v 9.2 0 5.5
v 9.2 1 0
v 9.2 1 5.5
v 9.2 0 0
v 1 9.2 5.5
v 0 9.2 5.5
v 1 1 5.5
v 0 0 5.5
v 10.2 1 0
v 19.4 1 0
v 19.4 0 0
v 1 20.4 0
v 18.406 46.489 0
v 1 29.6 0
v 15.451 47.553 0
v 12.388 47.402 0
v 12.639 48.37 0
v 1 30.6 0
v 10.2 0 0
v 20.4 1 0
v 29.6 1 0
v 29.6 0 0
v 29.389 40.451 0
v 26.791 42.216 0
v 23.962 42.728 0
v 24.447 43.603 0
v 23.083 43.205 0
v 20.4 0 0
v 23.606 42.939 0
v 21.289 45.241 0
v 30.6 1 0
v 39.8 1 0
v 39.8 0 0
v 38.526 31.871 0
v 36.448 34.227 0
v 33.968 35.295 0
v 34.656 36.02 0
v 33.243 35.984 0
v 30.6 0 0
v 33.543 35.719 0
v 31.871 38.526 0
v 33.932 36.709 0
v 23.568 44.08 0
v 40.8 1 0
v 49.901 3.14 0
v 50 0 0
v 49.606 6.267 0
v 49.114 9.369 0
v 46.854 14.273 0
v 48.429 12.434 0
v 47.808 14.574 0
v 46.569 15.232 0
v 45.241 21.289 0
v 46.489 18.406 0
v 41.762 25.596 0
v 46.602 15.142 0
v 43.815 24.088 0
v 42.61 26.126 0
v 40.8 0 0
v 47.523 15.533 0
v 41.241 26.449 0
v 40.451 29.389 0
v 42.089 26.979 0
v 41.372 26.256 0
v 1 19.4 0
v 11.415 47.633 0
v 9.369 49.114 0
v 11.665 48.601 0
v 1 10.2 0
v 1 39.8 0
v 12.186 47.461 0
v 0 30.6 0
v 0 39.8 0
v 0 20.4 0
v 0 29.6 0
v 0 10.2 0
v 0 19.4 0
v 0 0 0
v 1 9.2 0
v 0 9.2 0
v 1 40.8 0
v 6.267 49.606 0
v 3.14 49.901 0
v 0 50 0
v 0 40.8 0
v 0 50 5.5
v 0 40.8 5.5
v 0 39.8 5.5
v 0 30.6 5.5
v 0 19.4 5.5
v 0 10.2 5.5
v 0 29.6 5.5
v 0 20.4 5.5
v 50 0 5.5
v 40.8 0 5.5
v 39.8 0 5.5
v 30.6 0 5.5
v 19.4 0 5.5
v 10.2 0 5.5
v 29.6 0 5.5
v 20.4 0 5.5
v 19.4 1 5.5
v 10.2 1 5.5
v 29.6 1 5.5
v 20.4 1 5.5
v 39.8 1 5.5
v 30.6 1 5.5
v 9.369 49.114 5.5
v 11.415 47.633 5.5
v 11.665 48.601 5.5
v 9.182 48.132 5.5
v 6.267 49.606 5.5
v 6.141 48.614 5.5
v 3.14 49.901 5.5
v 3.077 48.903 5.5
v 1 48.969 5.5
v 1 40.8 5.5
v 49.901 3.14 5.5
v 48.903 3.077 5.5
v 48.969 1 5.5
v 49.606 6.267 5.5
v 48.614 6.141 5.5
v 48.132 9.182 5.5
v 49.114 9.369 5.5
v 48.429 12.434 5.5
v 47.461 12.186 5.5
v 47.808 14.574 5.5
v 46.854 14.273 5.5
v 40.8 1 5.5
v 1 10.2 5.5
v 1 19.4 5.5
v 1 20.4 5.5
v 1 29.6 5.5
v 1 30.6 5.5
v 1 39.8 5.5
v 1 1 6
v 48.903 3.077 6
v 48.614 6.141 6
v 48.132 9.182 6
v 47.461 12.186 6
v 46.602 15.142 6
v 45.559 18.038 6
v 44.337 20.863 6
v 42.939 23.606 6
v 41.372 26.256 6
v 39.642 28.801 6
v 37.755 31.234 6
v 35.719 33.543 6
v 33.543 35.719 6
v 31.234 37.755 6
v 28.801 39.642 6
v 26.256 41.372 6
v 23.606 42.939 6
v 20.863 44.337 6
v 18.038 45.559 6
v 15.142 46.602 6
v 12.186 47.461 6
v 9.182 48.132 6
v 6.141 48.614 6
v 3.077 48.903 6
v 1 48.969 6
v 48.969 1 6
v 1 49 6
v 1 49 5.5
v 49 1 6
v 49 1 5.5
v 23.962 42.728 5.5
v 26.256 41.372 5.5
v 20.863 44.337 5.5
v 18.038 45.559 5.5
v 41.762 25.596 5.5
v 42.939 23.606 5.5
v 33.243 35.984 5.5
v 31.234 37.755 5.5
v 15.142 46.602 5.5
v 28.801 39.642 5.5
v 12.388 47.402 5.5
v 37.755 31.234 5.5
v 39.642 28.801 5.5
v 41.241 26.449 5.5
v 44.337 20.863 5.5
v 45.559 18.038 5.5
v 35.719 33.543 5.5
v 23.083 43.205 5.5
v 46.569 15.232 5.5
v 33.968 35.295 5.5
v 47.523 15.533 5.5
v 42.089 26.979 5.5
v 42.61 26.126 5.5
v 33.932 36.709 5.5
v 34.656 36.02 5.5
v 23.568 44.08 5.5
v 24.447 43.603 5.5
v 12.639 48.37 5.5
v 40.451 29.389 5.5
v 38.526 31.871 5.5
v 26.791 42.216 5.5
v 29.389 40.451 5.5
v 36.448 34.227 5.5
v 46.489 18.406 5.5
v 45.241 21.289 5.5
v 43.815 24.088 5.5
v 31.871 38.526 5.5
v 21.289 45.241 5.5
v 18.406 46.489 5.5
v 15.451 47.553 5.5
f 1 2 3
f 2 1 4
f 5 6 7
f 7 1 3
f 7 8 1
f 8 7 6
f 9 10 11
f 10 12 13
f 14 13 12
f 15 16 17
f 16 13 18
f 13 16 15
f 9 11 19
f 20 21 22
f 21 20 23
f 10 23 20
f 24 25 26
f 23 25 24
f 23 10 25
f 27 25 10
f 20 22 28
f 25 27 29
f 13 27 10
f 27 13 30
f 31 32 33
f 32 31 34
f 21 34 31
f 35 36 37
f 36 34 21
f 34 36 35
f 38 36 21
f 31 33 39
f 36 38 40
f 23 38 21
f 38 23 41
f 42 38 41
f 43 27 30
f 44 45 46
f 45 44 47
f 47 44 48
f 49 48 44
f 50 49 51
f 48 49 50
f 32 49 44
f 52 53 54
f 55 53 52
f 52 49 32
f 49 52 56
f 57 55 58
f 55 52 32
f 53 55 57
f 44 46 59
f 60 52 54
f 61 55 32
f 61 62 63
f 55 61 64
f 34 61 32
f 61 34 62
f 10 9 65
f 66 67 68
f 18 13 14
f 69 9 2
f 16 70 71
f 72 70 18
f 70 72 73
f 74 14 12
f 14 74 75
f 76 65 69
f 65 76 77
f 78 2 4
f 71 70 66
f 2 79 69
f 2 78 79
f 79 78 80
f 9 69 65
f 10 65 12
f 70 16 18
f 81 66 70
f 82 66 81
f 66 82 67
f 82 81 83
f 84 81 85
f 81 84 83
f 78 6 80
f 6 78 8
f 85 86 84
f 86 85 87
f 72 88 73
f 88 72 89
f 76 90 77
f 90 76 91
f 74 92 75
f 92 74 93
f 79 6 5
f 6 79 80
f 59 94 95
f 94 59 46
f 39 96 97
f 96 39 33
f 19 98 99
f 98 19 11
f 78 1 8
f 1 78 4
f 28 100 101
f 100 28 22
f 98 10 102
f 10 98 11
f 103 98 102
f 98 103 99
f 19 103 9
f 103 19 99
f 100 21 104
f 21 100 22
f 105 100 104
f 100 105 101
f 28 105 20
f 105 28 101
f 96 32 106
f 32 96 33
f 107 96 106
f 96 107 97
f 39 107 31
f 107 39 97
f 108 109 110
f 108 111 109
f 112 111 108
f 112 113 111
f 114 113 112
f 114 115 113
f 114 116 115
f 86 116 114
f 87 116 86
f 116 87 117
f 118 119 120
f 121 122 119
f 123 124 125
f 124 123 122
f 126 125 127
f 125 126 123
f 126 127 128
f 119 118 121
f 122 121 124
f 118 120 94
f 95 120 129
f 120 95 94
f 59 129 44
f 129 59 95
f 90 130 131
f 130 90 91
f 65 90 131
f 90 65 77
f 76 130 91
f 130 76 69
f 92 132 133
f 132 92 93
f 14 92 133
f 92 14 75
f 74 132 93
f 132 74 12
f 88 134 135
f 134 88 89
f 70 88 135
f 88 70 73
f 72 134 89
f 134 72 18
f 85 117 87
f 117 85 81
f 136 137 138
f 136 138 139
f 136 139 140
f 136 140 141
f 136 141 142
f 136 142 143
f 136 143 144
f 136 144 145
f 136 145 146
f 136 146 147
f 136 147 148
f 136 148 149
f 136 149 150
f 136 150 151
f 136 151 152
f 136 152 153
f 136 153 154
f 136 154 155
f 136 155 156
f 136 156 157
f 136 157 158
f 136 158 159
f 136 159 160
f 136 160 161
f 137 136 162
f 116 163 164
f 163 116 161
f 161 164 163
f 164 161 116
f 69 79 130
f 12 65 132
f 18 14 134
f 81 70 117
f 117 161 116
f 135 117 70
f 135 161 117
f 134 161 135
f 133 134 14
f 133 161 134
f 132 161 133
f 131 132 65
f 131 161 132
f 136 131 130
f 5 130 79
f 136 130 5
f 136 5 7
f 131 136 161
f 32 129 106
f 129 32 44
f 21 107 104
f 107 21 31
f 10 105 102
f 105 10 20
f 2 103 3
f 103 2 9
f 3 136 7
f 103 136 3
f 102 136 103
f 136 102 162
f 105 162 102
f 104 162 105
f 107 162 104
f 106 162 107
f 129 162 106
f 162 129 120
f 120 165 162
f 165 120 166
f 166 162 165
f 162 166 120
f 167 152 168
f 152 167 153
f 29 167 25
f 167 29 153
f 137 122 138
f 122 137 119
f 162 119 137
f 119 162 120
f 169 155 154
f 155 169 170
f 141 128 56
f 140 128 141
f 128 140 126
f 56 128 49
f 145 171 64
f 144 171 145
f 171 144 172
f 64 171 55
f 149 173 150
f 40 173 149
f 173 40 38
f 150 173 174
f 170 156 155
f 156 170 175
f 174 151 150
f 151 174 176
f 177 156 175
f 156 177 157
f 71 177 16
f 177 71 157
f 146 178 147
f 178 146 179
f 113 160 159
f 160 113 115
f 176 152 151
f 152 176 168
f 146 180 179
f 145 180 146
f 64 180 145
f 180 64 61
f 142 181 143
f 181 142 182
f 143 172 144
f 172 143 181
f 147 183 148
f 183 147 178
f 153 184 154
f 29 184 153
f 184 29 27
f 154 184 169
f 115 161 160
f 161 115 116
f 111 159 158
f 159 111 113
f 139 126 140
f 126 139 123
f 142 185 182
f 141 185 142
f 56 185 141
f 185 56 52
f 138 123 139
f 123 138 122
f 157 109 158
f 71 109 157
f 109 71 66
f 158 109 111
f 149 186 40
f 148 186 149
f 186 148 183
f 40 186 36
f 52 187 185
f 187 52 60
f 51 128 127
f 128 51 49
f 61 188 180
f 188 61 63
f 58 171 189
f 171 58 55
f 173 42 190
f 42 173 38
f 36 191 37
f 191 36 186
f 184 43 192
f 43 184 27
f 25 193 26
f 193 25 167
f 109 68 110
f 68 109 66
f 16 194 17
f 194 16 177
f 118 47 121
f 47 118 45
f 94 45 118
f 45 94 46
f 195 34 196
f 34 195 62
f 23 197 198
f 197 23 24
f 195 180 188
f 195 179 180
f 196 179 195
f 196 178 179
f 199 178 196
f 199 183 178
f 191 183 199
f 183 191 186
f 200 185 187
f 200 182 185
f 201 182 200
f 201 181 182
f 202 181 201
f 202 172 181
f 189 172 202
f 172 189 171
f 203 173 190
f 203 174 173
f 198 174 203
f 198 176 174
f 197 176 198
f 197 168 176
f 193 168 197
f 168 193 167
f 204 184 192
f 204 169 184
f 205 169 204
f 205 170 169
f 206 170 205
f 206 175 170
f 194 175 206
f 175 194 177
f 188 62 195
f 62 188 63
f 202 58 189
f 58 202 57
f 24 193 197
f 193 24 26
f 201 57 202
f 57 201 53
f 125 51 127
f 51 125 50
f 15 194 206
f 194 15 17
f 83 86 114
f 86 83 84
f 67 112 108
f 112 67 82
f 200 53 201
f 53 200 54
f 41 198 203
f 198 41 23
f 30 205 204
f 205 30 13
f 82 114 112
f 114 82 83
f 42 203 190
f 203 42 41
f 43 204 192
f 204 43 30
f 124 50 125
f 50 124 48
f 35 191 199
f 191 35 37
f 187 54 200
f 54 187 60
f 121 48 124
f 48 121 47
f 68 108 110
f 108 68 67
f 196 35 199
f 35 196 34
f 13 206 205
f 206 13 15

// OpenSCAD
/* [Base Tile Size] */
x = 2; //[1,2,3,4]
y = 2; //[1,2,3,4]

/* [Edge Tile Support] */
// Size of edge tile addition, 9.2 is standard for openforge
edge_width = 12.5;
edge = "false"; // [false, true]

module curved_full_base(x,y,
        edge_width=12.5, edge="false") {
    e = edge == "true"?edge_width:0;
    l = 0;
    r = e;
    f = 0;
    b = e;
    color("LightGrey") intersection() {
        scale([x < y ? ((25*x)+e)/((25*y)+e) : 1, y < x ? ((25*y)+e)/((25*x)+e) : 1,1]) translate([0,0,0]) cylinder(10,max([x, y])*25+e, max([x,y])*25+e,$fn=100);
        difference() {
            union() {
                translate([0,0,0]) intersection() {
                    stone_base(x,y,edge_width,edge);
                    union() {
                        scale([x < y ? ((25*x)-1+e)/((25*y)-1+e) : 1, y < x ? ((25*y)-1+e)/((25*x)-1+e) : 1,1]) translate([0,0,0]) cylinder(6,max([x, y])*25-1+e, max([x,y])*25-1+e,$fn=100);
                        cube([25*x+e,1,8]);
                        cube([1,25*y+e,8]);
                    }
                }
                difference() {
                    union() {
                        intersection() {
                            translate([0,0,0]) difference() {
                                scale([x < y ? ((25*x)+e)/((25*y)+e) : 1, y < x ? ((25*y)+e)/((25*x)+e) : 1,1]) translate([0,0,0]) cylinder(5.5,max([x, y])*25+e, max([x,y])*25+e,$fn=100);
                                //#scale([x < y ? ((25*x)-9.2)/((25*y)-9.2) : 1, y < x ? ((25*y)-9.2)/((25*x)-9.2) : 1,1]) translate([0,0,-1]) cylinder(10,max([x, y])*25-9.2, max([x,y])*25-9.2,$fn=100);
                                if(x == 1) {
                                    if(y == 1) {
                                        translate([0,-.5,0]) rotate([0,0,50]) translate([0,0,-1]) cube([25*(max(x,y))+1+e,1,8]);
                                    } else if(y == 2) {
                                        translate([0,10.2*0.5,0]) rotate([0,0,0]) translate([0,0,-1]) cube([25*(max(x,y))+1+e,1,8]);
                                        translate([0,10.2*1.5-3,0]) rotate([0,0,8]) translate([0,0,-1]) cube([25*(max(x,y))+1+e,1,8]);
                                        translate([0,10.2*2.5-5,0]) rotate([0,0,17]) translate([0,0,-1]) cube([25*(max(x,y))+1+e,1,8]);
                                        translate([0,10.2*3.5-6,0]) rotate([0,0,28]) translate([0,0,-1]) cube([25*(max(x,y))+1+e,1,8]);
                                    } else if(y == 3) {
                                        translate([0,10.2*0.775-.5,0]) rotate([0,0,1]) translate([0,0,-1]) cube([25*(max(x,y))+1+e,1,8]);
                                        translate([0,10.2*1.8-1.5,0]) rotate([0,0,4]) translate([0,0,-1]) cube([25*(max(x,y))+1+e,1,8]);
                                        translate([0,10.2*2.825-2.5,0]) rotate([0,0,6]) translate([0,0,-1]) cube([25*(max(x,y))+1+e,1,8]);
                                        translate([0,10.2*3.85-3,0]) rotate([0,0,8]) translate([0,0,-1]) cube([25*(max(x,y))+1+e,1,8]);
                                        translate([0,10.2*4.875-3,0]) rotate([0,0,10]) translate([0,0,-1]) cube([25*(max(x,y))+1+e,1,8]);
                                        translate([0,10.2*5.9-3,0]) rotate([0,0,14]) translate([0,0,-1]) cube([25*(max(x,y))+1+e,1,8]);
                                    } else if(y == 4) {
                                        translate([0,10.2*1.2-1,0]) rotate([0,0,1]) translate([0,0,-1]) cube([25*(max(x,y))+1+e,1,8]);
                                        translate([0,10.2*2.2-2,0]) rotate([0,0,4]) translate([0,0,-1]) cube([25*(max(x,y))+1+e,1,8]);
                                        translate([0,10.2*3.2-2.5,0]) rotate([0,0,6]) translate([0,0,-1]) cube([25*(max(x,y))+1+e,1,8]);
                                        translate([0,10.2*4.2-3,0]) rotate([0,0,8]) translate([0,0,-1]) cube([25*(max(x,y))+1+e,1,8]);
                                        translate([0,10.2*5.2-3.5,0]) rotate([0,0,10]) translate([0,0,-1]) cube([25*(max(x,y))+1+e,1,8]);
                                        translate([0,10.2*6.2-4.5,0]) rotate([0,0,14]) translate([0,0,-1]) cube([25*(max(x,y))+1+e,1,8]);
                                        translate([0,10.2*7.2-4.5,0]) rotate([0,0,16]) translate([0,0,-1]) cube([25*(max(x,y))+1+e,1,8]);
                                        translate([0,10.2*8.2-4.25,0]) rotate([0,0,20]) translate([0,0,-1]) cube([25*(max(x,y))+1+e,1,8]);
                                    }
                                } else if(x == 2) {
                                    if(y == 1) {
                                        translate([10.2*0.5,0,0]) rotate([0,0,90-0]) translate([0,0,-1]) cube([25*(max(x,y))+1+e,1,8]);
                                        translate([10.2*1.5-3,0,0]) rotate([0,0,90-8]) translate([0,0,-1]) cube([25*(max(x,y))+1+e,1,8]);
                                        translate([10.2*2.5-5,0,0]) rotate([0,0,90-17]) translate([0,0,-1]) cube([25*(max(x,y))+1+e,1,8]);
                                        translate([10.2*3.5-6,0,0]) rotate([0,0,90-28]) translate([0,0,-1]) cube([25*(max(x,y))+1+e,1,8]);
                                    } else if(y == 2) {
                                        translate([0,-.5,0]) rotate([0,0,17.5]) translate([0,0,-1]) cube([25*(max(x,y))+1+e,1,8]);
                                        translate([0,-.5,0]) rotate([0,0,32]) translate([0,0,-1]) cube([25*(max(x,y))+1+e,1,8]);
                                        translate([0,-.5,0]) rotate([0,0,46.5]) translate([0,0,-1]) cube([25*(max(x,y))+1+e,1,8]);
                                        translate([0,-.5,0]) rotate([0,0,61]) translate([0,0,-1]) cube([25*(max(x,y))+1+e,1,8]);
                                        translate([0,-.5,0]) rotate([0,0,75.5]) translate([0,0,-1]) cube([25*(max(x,y))+1+e,1,8]);
                                    } else if(y == 3) {
                                        translate([0,10.2*1.2-4,0]) rotate([0,0,5.5]) translate([0,0,-1]) cube([25*(max(x,y))+1+e,1,8]);
                                        translate([0,10.2*2.2-6,0]) rotate([0,0,9]) translate([0,0,-1]) cube([25*(max(x,y))+1+e,1,8]);
                                        translate([0,10.2*3.2-8,0]) rotate([0,0,13.25]) translate([0,0,-1]) cube([25*(max(x,y))+1+e,1,8]);
                                        translate([0,10.2*4.2-15.7,0]) rotate([0,0,25]) translate([0,0,-1]) cube([25*(max(x,y))+1+e,1,8]);
                                        translate([0,10.2*5.2-20.5,0]) rotate([0,0,35]) translate([0,0,-1]) cube([25*(max(x,y))+1+e,1,8]);
                                        translate([0,10.2*6.2-23.5,0]) rotate([0,0,45]) translate([0,0,-1]) cube([25*(max(x,y))+1+e,1,8]);
                                        translate([0,10.2*7.2-26,0]) rotate([0,0,60.5]) translate([0,0,-1]) cube([25*(max(x,y))+1+e,1,8]);
                                    } else if(y == 4) {
                                        translate([0,10.2*0.5-3,0]) rotate([0,0,2]) translate([0,0,-1]) cube([25*(max(x,y))+1+e,1,8]);
                                        translate([0,10.2*1.5-7,0]) rotate([0,0,7]) translate([0,0,-1]) cube([25*(max(x,y))+1+e,1,8]);
                                        translate([0,10.2*2.5-10.5,0]) rotate([0,0,12]) translate([0,0,-1]) cube([25*(max(x,y))+1+e,1,8]);
                                        translate([0,10.2*3.5-14.25,0]) rotate([0,0,17]) translate([0,0,-1]) cube([25*(max(x,y))+1+e,1,8]);
                                        translate([0,10.2*4.5-16.5,0]) rotate([0,0,21]) translate([0,0,-1]) cube([25*(max(x,y))+1+e,1,8]);
                                        translate([0,10.2*5.5-18.5,0]) rotate([0,0,25]) translate([0,0,-1]) cube([25*(max(x,y))+1+e,1,8]);
                                        translate([0,10.2*6.5-22,0]) rotate([0,0,32]) translate([0,0,-1]) cube([25*(max(x,y))+1+e,1,8]);
                                        translate([0,10.2*7.5-21.5-.25,0]) rotate([0,0,36]) translate([0,0,-1]) cube([25*(max(x,y))+1+e,1,8]);
                                        translate([0,10.2*8.5-19.25,0]) rotate([0,0,39]) translate([0,0,-1]) cube([25*(max(x,y))+1+e,1,8]);
                                        translate([0,10.2*9.5-21,0]) rotate([0,0,55]) translate([0,0,-1]) cube([25*(max(x,y))+1+e,1,8]);
                                    }
                                } else if(x == 3) {
                                    if(y == 1) {
                                        translate([10.2*0.775-.5,0,0]) rotate([0,0,90-1]) translate([0,0,-1]) cube([25*(max(x,y))+1+e,1,8]);
                                        translate([10.2*1.8-1.5,0,0]) rotate([0,0,90-4]) translate([0,0,-1]) cube([25*(max(x,y))+1+e,1,8]);
                                        translate([10.2*2.825-2.5,0,0]) rotate([0,0,90-6]) translate([0,0,-1]) cube([25*(max(x,y))+1+e,1,8]);
                                        translate([10.2*3.85-3,0,0]) rotate([0,0,90-8]) translate([0,0,-1]) cube([25*(max(x,y))+1+e,1,8]);
                                        translate([10.2*4.875-3,0,0]) rotate([0,0,90-10]) translate([0,0,-1]) cube([25*(max(x,y))+1+e,1,8]);
                                        translate([10.2*5.9-3,0,0]) rotate([0,0,90-14]) translate([0,0,-1]) cube([25*(max(x,y))+1+e,1,8]);
                                    } else if(y == 2) {
                                        translate([10.2*1.2-4,0,0]) rotate([0,0,90-5.5]) translate([0,0,-1]) cube([25*(max(x,y))+1+e,1,8]);
                                        translate([10.2*2.2-6,0,0]) rotate([0,0,90-9]) translate([0,0,-1]) cube([25*(max(x,y))+1+e,1,8]);
                                        translate([10.2*3.2-8,0,0]) rotate([0,0,90-13.25]) translate([0,0,-1]) cube([25*(max(x,y))+1+e,1,8]);
                                        translate([10.2*4.2-15.7,0,0]) rotate([0,0,90-25]) translate([0,0,-1]) cube([25*(max(x,y))+1+e,1,8]);
                                        translate([10.2*5.2-20.5,0,0]) rotate([0,0,90-35]) translate([0,0,-1]) cube([25*(max(x,y))+1+e,1,8]);
                                        translate([10.2*6.2-23.5,0,0]) rotate([0,0,90-45]) translate([0,0,-1]) cube([25*(max(x,y))+1+e,1,8]);
                                        translate([10.2*7.2-26,0,0]) rotate([0,0,90-60.5]) translate([0,0,-1]) cube([25*(max(x,y))+1+e,1,8]);
                                    } else if(y == 3) {
                                        translate([0,-.5,0]) rotate([0,0,9]) translate([0,0,-1]) cube([25*(max(x,y))+1+e,1,8]);
                                        translate([0,-.5,0]) rotate([0,0,18]) translate([0,0,-1]) cube([25*(max(x,y))+1+e,1,8]);
                                        translate([0,-.5,0]) rotate([0,0,27]) translate([0,0,-1]) cube([25*(max(x,y))+1+e,1,8]);
                                        translate([0,-.5,0]) rotate([0,0,36]) translate([0,0,-1]) cube([25*(max(x,y))+1+e,1,8]);
                                        translate([0,-.5,0]) rotate([0,0,45]) translate([0,0,-1]) cube([25*(max(x,y))+1+e,1,8]);
                                        translate([0,-.5,0]) rotate([0,0,54]) translate([0,0,-1]) cube([25*(max(x,y))+1+e,1,8]);
                                        translate([0,-.5,0]) rotate([0,0,63]) translate([0,0,-1]) cube([25*(max(x,y))+1+e,1,8]);
                                        translate([0,-.5,0]) rotate([0,0,72]) translate([0,0,-1]) cube([25*(max(x,y))+1+e,1,8]);
                                        translate([0,-.5,0]) rotate([0,0,81]) translate([0,0,-1]) cube([25*(max(x,y))+1+e,1,8]);
                                    } else if(y == 4) {
                                        translate([0,10.2*1-2,0]) rotate([0,0,2]) translate([0,0,-1]) cube([25*(max(x,y))+1+e,1,8]);
                                        translate([0,10.2*2-7.5,0]) rotate([0,0,7]) translate([0,0,-1]) cube([25*(max(x,y))+1+e,1,8]);
                                        translate([0,10.2*3-12.75,0]) rotate([0,0,12]) translate([0,0,-1]) cube([25*(max(x,y))+1+e,1,8]);
                                        translate([0,10.2*4-14.25-3.75,0]) rotate([0,0,17]) translate([0,0,-1]) cube([25*(max(x,y))+1+e,1,8]);
                                        translate([0,10.2*5-16.5-9,0]) rotate([0,0,24]) translate([0,0,-1]) cube([25*(max(x,y))+1+e,1,8]);
                                        translate([0,10.2*6-18.5-10.25,0]) rotate([0,0,28]) translate([0,0,-1]) cube([25*(max(x,y))+1+e,1,8]);
                                        translate([0,10.2*7-22-17,0]) rotate([0,0,38]) translate([0,0,-1]) cube([25*(max(x,y))+1+e,1,8]);
                                        translate([0,10.2*8-21.5-20.5,0]) rotate([0,0,44]) translate([0,0,-1]) cube([25*(max(x,y))+1+e,1,8]);
                                        translate([0,10.2*9-19.25-32,0]) rotate([0,0,55]) translate([0,0,-1]) cube([25*(max(x,y))+1+e,1,8]);
                                        translate([0,10.2*10-58,0]) rotate([0,0,65]) translate([0,0,-1]) cube([25*(max(x,y))+1+e,1,8]);
                                        translate([0,10.2*11-59,0]) rotate([0,0,75]) translate([0,0,-1]) cube([25*(max(x,y))+1+e,1,8]);
                                    }
                                } else if(x == 4) {
                                    if(y == 1) {
                                        translate([10.2*1.2-1,0,0]) rotate([0,0,90-1]) translate([0,0,-1]) cube([25*(max(x,y))+1+e,1,8]);
                                        translate([10.2*2.2-2,0,0]) rotate([0,0,90-4]) translate([0,0,-1]) cube([25*(max(x,y))+1+e,1,8]);
                                        translate([10.2*3.2-2.5,0,0]) rotate([0,0,90-6]) translate([0,0,-1]) cube([25*(max(x,y))+1+e,1,8]);
                                        translate([10.2*4.2-3,0,0]) rotate([0,0,90-8]) translate([0,0,-1]) cube([25*(max(x,y))+1+e,1,8]);
                                        translate([10.2*5.2-3.5,0,0]) rotate([0,0,90-10]) translate([0,0,-1]) cube([25*(max(x,y))+1+e,1,8]);
                                        translate([10.2*6.2-4.5,0,0]) rotate([0,0,90-14]) translate([0,0,-1]) cube([25*(max(x,y))+1+e,1,8]);
                                        translate([10.2*7.2-4.5,0,0]) rotate([0,0,90-16]) translate([0,0,-1]) cube([25*(max(x,y))+1+e,1,8]);
                                        translate([10.2*8.2-4.25,0,0]) rotate([0,0,90-20]) translate([0,0,-1]) cube([25*(max(x,y))+1+e,1,8]);
                                    } else if(y == 2) {
                                        translate([10.2*0.5-3,0,0]) rotate([0,0,90-2]) translate([0,0,-1]) cube([25*(max(x,y))+1+e,1,8]);
                                        translate([10.2*1.5-7,0,0]) rotate([0,0,90-7]) translate([0,0,-1]) cube([25*(max(x,y))+1+e,1,8]);
                                        translate([10.2*2.5-10.5,0,0]) rotate([0,0,90-12]) translate([0,0,-1]) cube([25*(max(x,y))+1+e,1,8]);
                                        translate([10.2*3.5-14.25,0,0]) rotate([0,0,90-17]) translate([0,0,-1]) cube([25*(max(x,y))+1+e,1,8]);
                                        translate([10.2*4.5-16.5,0,0]) rotate([0,0,90-21]) translate([0,0,-1]) cube([25*(max(x,y))+1+e,1,8]);
                                        translate([10.2*5.5-18.5,0,0]) rotate([0,0,90-25]) translate([0,0,-1]) cube([25*(max(x,y))+1+e,1,8]);
                                        translate([10.2*6.5-22,0,0]) rotate([0,0,90-32]) translate([0,0,-1]) cube([25*(max(x,y))+1+e,1,8]);
                                        translate([10.2*7.5-21.5-.25,0,0]) rotate([0,0,90-36]) translate([0,0,-1]) cube([25*(max(x,y))+1+e,1,8]);
                                        translate([10.2*8.5-19.25,0,0]) rotate([0,0,90-39]) translate([0,0,-1]) cube([25*(max(x,y))+1+e,1,8]);
                                        translate([10.2*9.5-21,0,0]) rotate([0,0,90-55]) translate([0,0,-1]) cube([25*(max(x,y))+1+e,1,8]);
                                    } else if(y == 3) {
                                        translate([10.2*1-2,0,0]) rotate([0,0,90-2]) translate([0,0,-1]) cube([25*(max(x,y))+1+e,1,8]);
                                        translate([10.2*2-7.5,0,0]) rotate([0,0,90-7]) translate([0,0,-1]) cube([25*(max(x,y))+1+e,1,8]);
                                        translate([10.2*3-12.75,0,0]) rotate([0,0,90-12]) translate([0,0,-1]) cube([25*(max(x,y))+1+e,1,8]);
                                        translate([10.2*4-14.25-3.75,0,0]) rotate([0,0,90-17]) translate([0,0,-1]) cube([25*(max(x,y))+1+e,1,8]);
                                        translate([10.2*5-16.5-9,0,0]) rotate([0,0,90-24]) translate([0,0,-1]) cube([25*(max(x,y))+1+e,1,8]);
                                        translate([10.2*6-18.5-10.25,0,0]) rotate([0,0,90-28]) translate([0,0,-1]) cube([25*(max(x,y))+1+e,1,8]);
                                        translate([10.2*7-22-17,0,0]) rotate([0,0,90-38]) translate([0,0,-1]) cube([25*(max(x,y))+1+e,1,8]);
                                        translate([10.2*8-21.5-20.5,0,0]) rotate([0,0,90-44]) translate([0,0,-1]) cube([25*(max(x,y))+1+e,1,8]);
                                        translate([10.2*9-19.25-32,0,0]) rotate([0,0,90-55]) translate([0,0,-1]) cube([25*(max(x,y))+1+e,1,8]);
                                        translate([10.2*10-58,0,0]) rotate([0,0,90-65]) translate([0,0,-1]) cube([25*(max(x,y))+1+e,1,8]);
                                        translate([10.2*11-59,0,0]) rotate([0,0,90-75]) translate([0,0,-1]) cube([25*(max(x,y))+1+e,1,8]);
                                    } else if(y == 4) {
                                        translate([0,-.5,0]) rotate([0,0,90/14-.0625*12]) translate([0,0,-1]) cube([25*(max(x,y))+1+e,1,8]);
                                        translate([0,-.5,0]) rotate([0,0,90/14*2-.0625*11]) translate([0,0,-1]) cube([25*(max(x,y))+1+e,1,8]);
                                        translate([0,-.5,0]) rotate([0,0,90/14*3-.0625*10]) translate([0,0,-1]) cube([25*(max(x,y))+1+e,1,8]);
                                        translate([0,-.5,0]) rotate([0,0,90/14*4-.0625*9]) translate([0,0,-1]) cube([25*(max(x,y))+1+e,1,8]);
                                        translate([0,-.5,0]) rotate([0,0,90/14*5-.0625*8]) translate([0,0,-1]) cube([25*(max(x,y))+1+e,1,8]);
                                        translate([0,-.5,0]) rotate([0,0,90/14*6-.0625*7]) translate([0,0,-1]) cube([25*(max(x,y))+1+e,1,8]);
                                        translate([0,-.5,0]) rotate([0,0,90/14*7-.0625*6]) translate([0,0,-1]) cube([25*(max(x,y))+1+e,1,8]);
                                        translate([0,-.5,0]) rotate([0,0,90/14*8-.0625*5]) translate([0,0,-1]) cube([25*(max(x,y))+1+e,1,8]);
                                        translate([0,-.5,0]) rotate([0,0,90/14*9-.0625*4]) translate([0,0,-1]) cube([25*(max(x,y))+1+e,1,8]);
                                        translate([0,-.5,0]) rotate([0,0,90/14*10-.0625*3]) translate([0,0,-1]) cube([25*(max(x,y))+1+e,1,8]);
                                        translate([0,-.5,0]) rotate([0,0,90/14*11-.0625*2]) translate([0,0,-1]) cube([25*(max(x,y))+1+e,1,8]);
                                        translate([0,-.5,0]) rotate([0,0,90/14*12-.0625]) translate([0,0,-1]) cube([25*(max(x,y))+1+e,1,8]);
                                        translate([0,-.5,0]) rotate([0,0,90/14*13]) translate([0,0,-1]) cube([25*(max(x,y))+1+e,1,8]);
                                    }
                                }
                            }
                            translate([1,1,0]) cube([25*x+e,25*y+e,10]);
                        }
                    }                   
                }
            }
        }
    }
}

module stone_base(x,y,edge_width=12.5,edge="false") {
    e = edge == "true"?edge_width:0;
    l = e;
    r = e;
    f = e;
    b = e;
    length = 25*x+l+r;
    width = 25*y+f+b;
    xblocks = floor(length / 10.2);
    yblocks = floor(width / 10.2);
    
    intersection() {
        union() {
            for (i = [0:xblocks]) {
                translate([i*10.2,0,0]) cube([9.2,9.2,5.5]);
            }
            for (j = [0:yblocks]) {
                translate([0,j*10.2,0]) cube([9.2,9.2,5.5]);
            }
        }
        cube([length, width, 6]);
    }
    translate([1,1,0]) cube([length-2, width-2, 6]);
}

curved_full_base(x,y,edge_width,edge);
